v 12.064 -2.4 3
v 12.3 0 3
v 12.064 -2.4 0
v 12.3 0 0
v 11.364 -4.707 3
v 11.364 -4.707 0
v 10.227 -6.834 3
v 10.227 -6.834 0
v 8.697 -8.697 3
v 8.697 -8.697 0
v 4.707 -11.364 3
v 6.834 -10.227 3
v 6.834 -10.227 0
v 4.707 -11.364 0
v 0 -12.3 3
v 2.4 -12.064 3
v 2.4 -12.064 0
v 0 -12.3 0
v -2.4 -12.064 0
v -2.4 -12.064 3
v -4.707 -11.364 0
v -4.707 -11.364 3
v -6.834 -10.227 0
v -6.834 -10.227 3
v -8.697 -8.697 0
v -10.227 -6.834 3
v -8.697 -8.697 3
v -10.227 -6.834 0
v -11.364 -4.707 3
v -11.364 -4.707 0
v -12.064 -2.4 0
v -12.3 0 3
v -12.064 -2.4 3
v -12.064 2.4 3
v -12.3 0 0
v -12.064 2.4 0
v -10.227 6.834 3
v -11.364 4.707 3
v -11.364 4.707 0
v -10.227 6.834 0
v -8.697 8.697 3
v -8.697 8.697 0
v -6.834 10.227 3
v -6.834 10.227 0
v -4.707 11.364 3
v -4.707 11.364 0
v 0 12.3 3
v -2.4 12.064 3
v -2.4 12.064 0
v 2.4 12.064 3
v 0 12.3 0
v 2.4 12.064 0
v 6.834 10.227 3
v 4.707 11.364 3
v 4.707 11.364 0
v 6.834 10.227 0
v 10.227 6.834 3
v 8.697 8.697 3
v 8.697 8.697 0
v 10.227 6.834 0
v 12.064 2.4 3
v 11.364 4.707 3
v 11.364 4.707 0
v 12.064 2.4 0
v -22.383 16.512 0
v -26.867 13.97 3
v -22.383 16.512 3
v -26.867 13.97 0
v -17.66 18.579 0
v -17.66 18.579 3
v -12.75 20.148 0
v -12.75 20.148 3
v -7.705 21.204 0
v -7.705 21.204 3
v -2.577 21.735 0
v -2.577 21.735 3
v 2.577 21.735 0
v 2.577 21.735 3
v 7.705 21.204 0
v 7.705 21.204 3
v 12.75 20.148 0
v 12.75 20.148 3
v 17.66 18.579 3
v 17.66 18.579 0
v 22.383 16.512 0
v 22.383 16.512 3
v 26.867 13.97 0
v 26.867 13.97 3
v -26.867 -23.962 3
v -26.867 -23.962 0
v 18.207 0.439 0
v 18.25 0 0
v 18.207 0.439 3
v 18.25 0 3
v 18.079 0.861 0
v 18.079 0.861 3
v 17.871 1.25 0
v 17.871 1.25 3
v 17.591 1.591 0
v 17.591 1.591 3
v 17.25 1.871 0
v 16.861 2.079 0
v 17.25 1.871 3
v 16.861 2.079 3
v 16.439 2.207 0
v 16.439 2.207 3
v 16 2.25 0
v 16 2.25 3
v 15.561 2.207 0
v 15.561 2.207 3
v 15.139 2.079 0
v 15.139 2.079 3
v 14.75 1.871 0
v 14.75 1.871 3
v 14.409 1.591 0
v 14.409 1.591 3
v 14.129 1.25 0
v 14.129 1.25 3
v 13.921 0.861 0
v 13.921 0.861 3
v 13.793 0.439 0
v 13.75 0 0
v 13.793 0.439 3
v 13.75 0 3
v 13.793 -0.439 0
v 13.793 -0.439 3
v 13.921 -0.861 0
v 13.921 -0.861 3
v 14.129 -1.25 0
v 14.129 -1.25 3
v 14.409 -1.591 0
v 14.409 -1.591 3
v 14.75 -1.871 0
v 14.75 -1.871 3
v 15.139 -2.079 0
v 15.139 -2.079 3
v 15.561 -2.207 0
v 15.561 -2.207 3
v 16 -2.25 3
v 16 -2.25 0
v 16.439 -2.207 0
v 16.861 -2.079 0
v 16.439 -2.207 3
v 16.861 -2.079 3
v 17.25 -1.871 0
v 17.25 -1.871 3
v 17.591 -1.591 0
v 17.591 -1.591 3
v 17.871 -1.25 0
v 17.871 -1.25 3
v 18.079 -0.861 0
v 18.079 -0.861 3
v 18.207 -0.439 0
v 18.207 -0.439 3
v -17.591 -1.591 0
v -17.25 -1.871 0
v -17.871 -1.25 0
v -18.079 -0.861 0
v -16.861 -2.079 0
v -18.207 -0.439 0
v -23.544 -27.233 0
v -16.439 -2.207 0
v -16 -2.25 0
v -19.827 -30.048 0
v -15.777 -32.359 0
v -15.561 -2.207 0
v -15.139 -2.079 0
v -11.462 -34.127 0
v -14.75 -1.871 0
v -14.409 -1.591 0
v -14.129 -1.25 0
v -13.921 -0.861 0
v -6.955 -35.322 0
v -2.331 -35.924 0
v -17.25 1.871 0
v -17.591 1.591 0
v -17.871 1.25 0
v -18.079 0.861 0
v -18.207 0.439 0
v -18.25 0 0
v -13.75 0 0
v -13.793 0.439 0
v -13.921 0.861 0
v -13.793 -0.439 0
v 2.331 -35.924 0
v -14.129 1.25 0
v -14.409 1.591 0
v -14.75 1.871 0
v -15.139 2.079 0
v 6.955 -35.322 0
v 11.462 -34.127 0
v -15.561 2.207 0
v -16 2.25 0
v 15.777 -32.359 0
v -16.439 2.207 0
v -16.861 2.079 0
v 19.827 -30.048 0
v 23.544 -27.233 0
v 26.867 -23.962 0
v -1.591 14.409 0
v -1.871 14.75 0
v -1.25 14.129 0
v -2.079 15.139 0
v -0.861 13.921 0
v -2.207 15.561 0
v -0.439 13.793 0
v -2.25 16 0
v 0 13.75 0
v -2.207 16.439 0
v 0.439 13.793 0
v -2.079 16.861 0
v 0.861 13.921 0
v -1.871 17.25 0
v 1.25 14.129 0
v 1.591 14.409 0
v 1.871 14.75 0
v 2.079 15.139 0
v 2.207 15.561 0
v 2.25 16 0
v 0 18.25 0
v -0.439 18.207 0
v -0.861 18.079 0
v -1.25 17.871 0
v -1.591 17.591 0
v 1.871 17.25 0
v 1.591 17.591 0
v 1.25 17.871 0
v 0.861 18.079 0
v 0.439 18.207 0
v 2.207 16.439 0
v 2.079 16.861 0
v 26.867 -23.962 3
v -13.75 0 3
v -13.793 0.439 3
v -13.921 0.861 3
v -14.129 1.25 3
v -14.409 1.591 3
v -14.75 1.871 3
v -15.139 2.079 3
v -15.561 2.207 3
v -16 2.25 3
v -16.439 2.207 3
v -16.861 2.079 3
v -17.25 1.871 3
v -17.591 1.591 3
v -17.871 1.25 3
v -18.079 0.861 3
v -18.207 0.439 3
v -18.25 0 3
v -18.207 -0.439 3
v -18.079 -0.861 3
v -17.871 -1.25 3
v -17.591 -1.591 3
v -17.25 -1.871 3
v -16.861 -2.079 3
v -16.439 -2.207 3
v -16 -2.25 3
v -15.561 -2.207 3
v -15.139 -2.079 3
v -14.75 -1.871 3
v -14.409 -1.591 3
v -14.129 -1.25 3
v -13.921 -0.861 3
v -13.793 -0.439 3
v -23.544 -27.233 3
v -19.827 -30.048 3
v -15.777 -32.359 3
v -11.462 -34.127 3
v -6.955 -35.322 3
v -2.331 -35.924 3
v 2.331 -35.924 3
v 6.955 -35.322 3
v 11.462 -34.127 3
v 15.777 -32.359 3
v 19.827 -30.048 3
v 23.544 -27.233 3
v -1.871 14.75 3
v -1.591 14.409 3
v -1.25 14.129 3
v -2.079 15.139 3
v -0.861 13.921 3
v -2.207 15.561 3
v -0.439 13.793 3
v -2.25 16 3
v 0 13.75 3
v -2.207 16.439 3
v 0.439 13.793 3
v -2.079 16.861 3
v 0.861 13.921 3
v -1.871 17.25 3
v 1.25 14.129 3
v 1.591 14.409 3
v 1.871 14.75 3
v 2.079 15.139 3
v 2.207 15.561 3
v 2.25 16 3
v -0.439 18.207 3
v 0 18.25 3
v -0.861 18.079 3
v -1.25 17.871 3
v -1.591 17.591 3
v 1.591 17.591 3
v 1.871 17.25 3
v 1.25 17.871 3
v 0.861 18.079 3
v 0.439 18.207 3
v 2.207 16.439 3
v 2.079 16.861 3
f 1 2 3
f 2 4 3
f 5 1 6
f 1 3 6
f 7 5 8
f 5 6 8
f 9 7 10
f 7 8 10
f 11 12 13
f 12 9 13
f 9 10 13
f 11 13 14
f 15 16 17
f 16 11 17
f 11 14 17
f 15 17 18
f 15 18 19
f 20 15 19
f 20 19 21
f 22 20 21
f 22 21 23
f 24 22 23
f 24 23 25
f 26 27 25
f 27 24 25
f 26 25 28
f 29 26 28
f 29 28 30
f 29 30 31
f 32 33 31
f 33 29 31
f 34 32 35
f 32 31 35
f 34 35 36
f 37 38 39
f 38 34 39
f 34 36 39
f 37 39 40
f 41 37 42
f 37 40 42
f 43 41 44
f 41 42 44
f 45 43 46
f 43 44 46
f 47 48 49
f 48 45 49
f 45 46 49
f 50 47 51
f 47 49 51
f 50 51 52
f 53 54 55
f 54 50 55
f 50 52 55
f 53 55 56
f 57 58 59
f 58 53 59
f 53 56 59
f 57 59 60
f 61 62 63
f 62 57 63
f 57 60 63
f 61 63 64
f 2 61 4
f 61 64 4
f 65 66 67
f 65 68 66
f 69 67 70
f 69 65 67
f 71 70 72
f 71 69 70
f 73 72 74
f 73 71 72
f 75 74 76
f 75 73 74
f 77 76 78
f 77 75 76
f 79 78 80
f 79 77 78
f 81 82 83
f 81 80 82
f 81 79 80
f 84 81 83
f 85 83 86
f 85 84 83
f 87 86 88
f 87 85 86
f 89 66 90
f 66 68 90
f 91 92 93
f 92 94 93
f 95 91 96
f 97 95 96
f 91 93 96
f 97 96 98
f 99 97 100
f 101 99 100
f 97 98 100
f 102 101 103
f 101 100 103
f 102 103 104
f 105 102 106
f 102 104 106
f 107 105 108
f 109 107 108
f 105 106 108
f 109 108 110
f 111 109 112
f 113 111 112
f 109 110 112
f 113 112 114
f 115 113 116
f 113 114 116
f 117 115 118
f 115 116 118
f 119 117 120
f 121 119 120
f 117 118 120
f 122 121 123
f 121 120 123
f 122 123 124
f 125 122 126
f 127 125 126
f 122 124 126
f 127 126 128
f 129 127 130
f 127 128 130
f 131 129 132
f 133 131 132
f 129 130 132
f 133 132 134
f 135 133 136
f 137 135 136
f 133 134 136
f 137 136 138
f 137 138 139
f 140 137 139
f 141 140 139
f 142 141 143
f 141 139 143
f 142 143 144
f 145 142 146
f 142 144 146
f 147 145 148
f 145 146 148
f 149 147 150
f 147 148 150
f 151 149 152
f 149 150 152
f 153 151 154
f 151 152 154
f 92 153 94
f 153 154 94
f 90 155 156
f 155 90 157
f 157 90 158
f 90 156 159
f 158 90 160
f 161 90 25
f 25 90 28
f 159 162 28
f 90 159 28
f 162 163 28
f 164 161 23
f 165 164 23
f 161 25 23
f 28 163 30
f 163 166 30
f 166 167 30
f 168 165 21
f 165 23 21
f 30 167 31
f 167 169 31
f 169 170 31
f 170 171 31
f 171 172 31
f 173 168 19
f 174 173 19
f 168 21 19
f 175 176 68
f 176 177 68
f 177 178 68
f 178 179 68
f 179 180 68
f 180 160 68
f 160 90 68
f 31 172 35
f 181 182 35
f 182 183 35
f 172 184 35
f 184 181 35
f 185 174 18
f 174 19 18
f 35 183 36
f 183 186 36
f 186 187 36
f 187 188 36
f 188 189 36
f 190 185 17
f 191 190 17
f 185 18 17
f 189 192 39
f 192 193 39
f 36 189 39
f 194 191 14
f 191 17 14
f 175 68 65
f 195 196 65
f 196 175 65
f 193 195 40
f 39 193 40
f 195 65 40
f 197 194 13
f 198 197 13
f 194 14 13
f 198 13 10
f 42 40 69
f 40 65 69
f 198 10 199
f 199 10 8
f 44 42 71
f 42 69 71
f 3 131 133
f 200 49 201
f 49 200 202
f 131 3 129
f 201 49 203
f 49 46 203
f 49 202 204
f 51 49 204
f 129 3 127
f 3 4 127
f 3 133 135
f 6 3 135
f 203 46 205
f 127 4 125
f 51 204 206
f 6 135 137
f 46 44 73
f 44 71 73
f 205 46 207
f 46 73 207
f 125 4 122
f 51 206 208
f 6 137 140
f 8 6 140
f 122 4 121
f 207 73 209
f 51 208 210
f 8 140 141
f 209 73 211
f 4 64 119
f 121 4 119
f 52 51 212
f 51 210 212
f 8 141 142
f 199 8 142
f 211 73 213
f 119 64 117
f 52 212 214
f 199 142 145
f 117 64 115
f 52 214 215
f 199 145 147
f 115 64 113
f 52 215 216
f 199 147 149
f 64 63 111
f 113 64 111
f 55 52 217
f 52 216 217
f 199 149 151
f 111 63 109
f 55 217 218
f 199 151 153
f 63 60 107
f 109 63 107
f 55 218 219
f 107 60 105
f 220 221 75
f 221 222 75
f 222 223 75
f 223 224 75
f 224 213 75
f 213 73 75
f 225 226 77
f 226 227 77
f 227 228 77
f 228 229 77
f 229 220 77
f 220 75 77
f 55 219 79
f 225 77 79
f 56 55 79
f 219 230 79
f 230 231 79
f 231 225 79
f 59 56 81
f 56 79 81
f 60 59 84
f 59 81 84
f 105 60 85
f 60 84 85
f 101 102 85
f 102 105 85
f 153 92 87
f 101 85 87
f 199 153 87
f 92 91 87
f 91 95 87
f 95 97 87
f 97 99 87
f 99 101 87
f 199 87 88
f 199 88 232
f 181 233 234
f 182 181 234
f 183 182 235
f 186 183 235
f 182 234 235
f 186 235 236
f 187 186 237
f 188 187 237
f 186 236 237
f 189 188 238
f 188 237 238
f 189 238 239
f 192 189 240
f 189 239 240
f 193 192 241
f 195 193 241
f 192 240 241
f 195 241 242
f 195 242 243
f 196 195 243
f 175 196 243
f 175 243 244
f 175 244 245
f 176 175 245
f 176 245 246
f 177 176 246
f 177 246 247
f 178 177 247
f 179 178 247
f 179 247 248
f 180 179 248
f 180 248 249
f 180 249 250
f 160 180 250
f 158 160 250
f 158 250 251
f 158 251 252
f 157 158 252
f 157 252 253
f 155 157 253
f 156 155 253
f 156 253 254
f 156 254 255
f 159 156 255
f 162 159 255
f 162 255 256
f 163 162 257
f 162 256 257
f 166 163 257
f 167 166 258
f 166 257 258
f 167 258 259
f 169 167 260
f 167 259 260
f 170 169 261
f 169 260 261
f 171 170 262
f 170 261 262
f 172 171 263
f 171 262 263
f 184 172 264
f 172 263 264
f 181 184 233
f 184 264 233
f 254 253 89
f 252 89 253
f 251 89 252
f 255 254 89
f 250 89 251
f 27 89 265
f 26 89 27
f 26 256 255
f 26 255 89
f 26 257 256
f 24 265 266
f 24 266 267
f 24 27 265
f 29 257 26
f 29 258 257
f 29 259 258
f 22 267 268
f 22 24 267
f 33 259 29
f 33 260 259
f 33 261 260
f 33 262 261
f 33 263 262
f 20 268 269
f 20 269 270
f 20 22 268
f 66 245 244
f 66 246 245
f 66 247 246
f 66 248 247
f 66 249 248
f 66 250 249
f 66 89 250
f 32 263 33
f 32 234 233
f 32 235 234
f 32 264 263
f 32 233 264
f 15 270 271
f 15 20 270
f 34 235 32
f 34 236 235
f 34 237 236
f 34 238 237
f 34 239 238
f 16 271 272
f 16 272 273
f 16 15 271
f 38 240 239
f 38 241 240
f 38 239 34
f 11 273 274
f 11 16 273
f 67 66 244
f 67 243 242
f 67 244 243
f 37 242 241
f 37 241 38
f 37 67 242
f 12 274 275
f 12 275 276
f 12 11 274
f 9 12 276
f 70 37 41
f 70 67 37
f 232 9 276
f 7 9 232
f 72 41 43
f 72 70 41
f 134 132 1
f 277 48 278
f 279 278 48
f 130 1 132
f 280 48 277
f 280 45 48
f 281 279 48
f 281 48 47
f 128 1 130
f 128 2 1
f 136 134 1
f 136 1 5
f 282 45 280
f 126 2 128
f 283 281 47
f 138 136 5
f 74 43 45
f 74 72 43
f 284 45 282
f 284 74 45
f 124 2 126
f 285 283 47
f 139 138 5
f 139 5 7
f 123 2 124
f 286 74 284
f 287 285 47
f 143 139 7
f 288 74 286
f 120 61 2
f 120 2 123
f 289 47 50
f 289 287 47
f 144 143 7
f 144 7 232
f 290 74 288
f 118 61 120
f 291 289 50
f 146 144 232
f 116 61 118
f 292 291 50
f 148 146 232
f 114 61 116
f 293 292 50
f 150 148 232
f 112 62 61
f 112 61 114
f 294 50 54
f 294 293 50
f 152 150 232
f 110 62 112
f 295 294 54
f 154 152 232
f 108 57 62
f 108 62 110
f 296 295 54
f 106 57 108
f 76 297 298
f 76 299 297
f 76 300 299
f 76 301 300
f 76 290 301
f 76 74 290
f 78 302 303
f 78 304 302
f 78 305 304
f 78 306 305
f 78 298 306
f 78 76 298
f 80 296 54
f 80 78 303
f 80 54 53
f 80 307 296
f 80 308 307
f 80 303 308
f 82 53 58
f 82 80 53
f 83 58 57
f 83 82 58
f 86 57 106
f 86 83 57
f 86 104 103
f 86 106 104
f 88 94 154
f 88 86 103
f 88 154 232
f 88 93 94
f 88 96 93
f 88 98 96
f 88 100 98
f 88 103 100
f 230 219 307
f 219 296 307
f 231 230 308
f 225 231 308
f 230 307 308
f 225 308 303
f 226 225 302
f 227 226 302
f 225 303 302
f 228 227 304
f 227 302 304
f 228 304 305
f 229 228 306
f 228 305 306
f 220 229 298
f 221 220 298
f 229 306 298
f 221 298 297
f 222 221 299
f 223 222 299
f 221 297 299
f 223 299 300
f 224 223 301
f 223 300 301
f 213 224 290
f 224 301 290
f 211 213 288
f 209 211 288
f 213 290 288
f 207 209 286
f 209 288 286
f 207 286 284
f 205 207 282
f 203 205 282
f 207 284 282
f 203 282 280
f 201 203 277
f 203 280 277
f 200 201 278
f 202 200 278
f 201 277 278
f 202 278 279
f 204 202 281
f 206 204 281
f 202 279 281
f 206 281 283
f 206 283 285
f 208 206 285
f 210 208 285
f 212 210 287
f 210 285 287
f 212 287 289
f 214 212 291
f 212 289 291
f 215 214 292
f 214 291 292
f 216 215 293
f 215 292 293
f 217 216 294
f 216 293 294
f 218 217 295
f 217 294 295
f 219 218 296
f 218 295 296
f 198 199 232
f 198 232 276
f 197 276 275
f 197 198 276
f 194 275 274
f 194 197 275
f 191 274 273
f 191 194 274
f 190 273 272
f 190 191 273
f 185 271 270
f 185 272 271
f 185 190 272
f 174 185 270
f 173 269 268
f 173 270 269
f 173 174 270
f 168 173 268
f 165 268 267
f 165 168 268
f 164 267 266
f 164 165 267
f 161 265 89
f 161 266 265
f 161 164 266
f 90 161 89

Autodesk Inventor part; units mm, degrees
ref_plane "YZ Plane" through (0, 0, 0) normal (1, 0, 0) x (0, 1, 0)
ref_plane "XZ Plane" through (0, 0, 0) normal (0, 1, 0) x (-1, 0, 0)
ref_plane "XY Plane" through (0, 0, 0) normal (0, 0, 1) x (1, 0, 0)
sketch "Sketch1" plane through (0, 0, 0) normal (0, 0, 1) x (1, 0, 0)
  circle A0 centre (0, 0) radius 12.3
  arc A1 (-26.8669, -23.9619) -> (26.8669, -23.9619) centre (0, 0) ccw
  line L0 (-26.8669, 13.9698) -> (-26.8669, -23.9619)
  line L1 (26.8669, 13.9698) -> (26.8669, -23.9619)
  arc A2 (26.8669, -23.9619) -> (-26.8669, -23.9619) centre (0, 0) ccw construction
  arc A3 (-26.8669, 13.9698) -> (26.8669, 13.9698) centre (0, 0) ccw construction
  arc A4 (26.8669, 13.9698) -> (-26.8669, 13.9698) centre (0, -28.1986) ccw
  line L2 (0, -28.1986) -> (0, 0) construction
  dimension "d0" = 24.6
  dimension "d1" = 72
  dimension "d13" = 50
extrude "Extrusion1" add sketch "Sketch1" along normal blind 3
sketch "Sketch2" plane through (0, 0, 3) normal (0, 0, 1) x (1, 0, 0)
  circle A0 centre (-16, 0) radius 2.25
  circle A1 centre (16, 0) radius 2.25
  circle A2 centre (0, 16) radius 2.25
  line L0 (0, 0) -> (0, 16) construction
  line L1 (0, 0) -> (16, 0) construction
  line L2 (0, 0) -> (-16, 0) construction
  dimension "d5" = 4.5
  dimension "d6" = 4.5
  dimension "d7" = 4.5
  dimension "d8" = 16
  dimension "d9" = 16
  dimension "d10" = 16
extrude "Extrusion2" cut sketch "Sketch2" against normal blind 3
equation "\"d9\" = d8"
equation "\"d10\" = d8"
properties part number "Gear Protection Piece" material "Aluminum 6061"
